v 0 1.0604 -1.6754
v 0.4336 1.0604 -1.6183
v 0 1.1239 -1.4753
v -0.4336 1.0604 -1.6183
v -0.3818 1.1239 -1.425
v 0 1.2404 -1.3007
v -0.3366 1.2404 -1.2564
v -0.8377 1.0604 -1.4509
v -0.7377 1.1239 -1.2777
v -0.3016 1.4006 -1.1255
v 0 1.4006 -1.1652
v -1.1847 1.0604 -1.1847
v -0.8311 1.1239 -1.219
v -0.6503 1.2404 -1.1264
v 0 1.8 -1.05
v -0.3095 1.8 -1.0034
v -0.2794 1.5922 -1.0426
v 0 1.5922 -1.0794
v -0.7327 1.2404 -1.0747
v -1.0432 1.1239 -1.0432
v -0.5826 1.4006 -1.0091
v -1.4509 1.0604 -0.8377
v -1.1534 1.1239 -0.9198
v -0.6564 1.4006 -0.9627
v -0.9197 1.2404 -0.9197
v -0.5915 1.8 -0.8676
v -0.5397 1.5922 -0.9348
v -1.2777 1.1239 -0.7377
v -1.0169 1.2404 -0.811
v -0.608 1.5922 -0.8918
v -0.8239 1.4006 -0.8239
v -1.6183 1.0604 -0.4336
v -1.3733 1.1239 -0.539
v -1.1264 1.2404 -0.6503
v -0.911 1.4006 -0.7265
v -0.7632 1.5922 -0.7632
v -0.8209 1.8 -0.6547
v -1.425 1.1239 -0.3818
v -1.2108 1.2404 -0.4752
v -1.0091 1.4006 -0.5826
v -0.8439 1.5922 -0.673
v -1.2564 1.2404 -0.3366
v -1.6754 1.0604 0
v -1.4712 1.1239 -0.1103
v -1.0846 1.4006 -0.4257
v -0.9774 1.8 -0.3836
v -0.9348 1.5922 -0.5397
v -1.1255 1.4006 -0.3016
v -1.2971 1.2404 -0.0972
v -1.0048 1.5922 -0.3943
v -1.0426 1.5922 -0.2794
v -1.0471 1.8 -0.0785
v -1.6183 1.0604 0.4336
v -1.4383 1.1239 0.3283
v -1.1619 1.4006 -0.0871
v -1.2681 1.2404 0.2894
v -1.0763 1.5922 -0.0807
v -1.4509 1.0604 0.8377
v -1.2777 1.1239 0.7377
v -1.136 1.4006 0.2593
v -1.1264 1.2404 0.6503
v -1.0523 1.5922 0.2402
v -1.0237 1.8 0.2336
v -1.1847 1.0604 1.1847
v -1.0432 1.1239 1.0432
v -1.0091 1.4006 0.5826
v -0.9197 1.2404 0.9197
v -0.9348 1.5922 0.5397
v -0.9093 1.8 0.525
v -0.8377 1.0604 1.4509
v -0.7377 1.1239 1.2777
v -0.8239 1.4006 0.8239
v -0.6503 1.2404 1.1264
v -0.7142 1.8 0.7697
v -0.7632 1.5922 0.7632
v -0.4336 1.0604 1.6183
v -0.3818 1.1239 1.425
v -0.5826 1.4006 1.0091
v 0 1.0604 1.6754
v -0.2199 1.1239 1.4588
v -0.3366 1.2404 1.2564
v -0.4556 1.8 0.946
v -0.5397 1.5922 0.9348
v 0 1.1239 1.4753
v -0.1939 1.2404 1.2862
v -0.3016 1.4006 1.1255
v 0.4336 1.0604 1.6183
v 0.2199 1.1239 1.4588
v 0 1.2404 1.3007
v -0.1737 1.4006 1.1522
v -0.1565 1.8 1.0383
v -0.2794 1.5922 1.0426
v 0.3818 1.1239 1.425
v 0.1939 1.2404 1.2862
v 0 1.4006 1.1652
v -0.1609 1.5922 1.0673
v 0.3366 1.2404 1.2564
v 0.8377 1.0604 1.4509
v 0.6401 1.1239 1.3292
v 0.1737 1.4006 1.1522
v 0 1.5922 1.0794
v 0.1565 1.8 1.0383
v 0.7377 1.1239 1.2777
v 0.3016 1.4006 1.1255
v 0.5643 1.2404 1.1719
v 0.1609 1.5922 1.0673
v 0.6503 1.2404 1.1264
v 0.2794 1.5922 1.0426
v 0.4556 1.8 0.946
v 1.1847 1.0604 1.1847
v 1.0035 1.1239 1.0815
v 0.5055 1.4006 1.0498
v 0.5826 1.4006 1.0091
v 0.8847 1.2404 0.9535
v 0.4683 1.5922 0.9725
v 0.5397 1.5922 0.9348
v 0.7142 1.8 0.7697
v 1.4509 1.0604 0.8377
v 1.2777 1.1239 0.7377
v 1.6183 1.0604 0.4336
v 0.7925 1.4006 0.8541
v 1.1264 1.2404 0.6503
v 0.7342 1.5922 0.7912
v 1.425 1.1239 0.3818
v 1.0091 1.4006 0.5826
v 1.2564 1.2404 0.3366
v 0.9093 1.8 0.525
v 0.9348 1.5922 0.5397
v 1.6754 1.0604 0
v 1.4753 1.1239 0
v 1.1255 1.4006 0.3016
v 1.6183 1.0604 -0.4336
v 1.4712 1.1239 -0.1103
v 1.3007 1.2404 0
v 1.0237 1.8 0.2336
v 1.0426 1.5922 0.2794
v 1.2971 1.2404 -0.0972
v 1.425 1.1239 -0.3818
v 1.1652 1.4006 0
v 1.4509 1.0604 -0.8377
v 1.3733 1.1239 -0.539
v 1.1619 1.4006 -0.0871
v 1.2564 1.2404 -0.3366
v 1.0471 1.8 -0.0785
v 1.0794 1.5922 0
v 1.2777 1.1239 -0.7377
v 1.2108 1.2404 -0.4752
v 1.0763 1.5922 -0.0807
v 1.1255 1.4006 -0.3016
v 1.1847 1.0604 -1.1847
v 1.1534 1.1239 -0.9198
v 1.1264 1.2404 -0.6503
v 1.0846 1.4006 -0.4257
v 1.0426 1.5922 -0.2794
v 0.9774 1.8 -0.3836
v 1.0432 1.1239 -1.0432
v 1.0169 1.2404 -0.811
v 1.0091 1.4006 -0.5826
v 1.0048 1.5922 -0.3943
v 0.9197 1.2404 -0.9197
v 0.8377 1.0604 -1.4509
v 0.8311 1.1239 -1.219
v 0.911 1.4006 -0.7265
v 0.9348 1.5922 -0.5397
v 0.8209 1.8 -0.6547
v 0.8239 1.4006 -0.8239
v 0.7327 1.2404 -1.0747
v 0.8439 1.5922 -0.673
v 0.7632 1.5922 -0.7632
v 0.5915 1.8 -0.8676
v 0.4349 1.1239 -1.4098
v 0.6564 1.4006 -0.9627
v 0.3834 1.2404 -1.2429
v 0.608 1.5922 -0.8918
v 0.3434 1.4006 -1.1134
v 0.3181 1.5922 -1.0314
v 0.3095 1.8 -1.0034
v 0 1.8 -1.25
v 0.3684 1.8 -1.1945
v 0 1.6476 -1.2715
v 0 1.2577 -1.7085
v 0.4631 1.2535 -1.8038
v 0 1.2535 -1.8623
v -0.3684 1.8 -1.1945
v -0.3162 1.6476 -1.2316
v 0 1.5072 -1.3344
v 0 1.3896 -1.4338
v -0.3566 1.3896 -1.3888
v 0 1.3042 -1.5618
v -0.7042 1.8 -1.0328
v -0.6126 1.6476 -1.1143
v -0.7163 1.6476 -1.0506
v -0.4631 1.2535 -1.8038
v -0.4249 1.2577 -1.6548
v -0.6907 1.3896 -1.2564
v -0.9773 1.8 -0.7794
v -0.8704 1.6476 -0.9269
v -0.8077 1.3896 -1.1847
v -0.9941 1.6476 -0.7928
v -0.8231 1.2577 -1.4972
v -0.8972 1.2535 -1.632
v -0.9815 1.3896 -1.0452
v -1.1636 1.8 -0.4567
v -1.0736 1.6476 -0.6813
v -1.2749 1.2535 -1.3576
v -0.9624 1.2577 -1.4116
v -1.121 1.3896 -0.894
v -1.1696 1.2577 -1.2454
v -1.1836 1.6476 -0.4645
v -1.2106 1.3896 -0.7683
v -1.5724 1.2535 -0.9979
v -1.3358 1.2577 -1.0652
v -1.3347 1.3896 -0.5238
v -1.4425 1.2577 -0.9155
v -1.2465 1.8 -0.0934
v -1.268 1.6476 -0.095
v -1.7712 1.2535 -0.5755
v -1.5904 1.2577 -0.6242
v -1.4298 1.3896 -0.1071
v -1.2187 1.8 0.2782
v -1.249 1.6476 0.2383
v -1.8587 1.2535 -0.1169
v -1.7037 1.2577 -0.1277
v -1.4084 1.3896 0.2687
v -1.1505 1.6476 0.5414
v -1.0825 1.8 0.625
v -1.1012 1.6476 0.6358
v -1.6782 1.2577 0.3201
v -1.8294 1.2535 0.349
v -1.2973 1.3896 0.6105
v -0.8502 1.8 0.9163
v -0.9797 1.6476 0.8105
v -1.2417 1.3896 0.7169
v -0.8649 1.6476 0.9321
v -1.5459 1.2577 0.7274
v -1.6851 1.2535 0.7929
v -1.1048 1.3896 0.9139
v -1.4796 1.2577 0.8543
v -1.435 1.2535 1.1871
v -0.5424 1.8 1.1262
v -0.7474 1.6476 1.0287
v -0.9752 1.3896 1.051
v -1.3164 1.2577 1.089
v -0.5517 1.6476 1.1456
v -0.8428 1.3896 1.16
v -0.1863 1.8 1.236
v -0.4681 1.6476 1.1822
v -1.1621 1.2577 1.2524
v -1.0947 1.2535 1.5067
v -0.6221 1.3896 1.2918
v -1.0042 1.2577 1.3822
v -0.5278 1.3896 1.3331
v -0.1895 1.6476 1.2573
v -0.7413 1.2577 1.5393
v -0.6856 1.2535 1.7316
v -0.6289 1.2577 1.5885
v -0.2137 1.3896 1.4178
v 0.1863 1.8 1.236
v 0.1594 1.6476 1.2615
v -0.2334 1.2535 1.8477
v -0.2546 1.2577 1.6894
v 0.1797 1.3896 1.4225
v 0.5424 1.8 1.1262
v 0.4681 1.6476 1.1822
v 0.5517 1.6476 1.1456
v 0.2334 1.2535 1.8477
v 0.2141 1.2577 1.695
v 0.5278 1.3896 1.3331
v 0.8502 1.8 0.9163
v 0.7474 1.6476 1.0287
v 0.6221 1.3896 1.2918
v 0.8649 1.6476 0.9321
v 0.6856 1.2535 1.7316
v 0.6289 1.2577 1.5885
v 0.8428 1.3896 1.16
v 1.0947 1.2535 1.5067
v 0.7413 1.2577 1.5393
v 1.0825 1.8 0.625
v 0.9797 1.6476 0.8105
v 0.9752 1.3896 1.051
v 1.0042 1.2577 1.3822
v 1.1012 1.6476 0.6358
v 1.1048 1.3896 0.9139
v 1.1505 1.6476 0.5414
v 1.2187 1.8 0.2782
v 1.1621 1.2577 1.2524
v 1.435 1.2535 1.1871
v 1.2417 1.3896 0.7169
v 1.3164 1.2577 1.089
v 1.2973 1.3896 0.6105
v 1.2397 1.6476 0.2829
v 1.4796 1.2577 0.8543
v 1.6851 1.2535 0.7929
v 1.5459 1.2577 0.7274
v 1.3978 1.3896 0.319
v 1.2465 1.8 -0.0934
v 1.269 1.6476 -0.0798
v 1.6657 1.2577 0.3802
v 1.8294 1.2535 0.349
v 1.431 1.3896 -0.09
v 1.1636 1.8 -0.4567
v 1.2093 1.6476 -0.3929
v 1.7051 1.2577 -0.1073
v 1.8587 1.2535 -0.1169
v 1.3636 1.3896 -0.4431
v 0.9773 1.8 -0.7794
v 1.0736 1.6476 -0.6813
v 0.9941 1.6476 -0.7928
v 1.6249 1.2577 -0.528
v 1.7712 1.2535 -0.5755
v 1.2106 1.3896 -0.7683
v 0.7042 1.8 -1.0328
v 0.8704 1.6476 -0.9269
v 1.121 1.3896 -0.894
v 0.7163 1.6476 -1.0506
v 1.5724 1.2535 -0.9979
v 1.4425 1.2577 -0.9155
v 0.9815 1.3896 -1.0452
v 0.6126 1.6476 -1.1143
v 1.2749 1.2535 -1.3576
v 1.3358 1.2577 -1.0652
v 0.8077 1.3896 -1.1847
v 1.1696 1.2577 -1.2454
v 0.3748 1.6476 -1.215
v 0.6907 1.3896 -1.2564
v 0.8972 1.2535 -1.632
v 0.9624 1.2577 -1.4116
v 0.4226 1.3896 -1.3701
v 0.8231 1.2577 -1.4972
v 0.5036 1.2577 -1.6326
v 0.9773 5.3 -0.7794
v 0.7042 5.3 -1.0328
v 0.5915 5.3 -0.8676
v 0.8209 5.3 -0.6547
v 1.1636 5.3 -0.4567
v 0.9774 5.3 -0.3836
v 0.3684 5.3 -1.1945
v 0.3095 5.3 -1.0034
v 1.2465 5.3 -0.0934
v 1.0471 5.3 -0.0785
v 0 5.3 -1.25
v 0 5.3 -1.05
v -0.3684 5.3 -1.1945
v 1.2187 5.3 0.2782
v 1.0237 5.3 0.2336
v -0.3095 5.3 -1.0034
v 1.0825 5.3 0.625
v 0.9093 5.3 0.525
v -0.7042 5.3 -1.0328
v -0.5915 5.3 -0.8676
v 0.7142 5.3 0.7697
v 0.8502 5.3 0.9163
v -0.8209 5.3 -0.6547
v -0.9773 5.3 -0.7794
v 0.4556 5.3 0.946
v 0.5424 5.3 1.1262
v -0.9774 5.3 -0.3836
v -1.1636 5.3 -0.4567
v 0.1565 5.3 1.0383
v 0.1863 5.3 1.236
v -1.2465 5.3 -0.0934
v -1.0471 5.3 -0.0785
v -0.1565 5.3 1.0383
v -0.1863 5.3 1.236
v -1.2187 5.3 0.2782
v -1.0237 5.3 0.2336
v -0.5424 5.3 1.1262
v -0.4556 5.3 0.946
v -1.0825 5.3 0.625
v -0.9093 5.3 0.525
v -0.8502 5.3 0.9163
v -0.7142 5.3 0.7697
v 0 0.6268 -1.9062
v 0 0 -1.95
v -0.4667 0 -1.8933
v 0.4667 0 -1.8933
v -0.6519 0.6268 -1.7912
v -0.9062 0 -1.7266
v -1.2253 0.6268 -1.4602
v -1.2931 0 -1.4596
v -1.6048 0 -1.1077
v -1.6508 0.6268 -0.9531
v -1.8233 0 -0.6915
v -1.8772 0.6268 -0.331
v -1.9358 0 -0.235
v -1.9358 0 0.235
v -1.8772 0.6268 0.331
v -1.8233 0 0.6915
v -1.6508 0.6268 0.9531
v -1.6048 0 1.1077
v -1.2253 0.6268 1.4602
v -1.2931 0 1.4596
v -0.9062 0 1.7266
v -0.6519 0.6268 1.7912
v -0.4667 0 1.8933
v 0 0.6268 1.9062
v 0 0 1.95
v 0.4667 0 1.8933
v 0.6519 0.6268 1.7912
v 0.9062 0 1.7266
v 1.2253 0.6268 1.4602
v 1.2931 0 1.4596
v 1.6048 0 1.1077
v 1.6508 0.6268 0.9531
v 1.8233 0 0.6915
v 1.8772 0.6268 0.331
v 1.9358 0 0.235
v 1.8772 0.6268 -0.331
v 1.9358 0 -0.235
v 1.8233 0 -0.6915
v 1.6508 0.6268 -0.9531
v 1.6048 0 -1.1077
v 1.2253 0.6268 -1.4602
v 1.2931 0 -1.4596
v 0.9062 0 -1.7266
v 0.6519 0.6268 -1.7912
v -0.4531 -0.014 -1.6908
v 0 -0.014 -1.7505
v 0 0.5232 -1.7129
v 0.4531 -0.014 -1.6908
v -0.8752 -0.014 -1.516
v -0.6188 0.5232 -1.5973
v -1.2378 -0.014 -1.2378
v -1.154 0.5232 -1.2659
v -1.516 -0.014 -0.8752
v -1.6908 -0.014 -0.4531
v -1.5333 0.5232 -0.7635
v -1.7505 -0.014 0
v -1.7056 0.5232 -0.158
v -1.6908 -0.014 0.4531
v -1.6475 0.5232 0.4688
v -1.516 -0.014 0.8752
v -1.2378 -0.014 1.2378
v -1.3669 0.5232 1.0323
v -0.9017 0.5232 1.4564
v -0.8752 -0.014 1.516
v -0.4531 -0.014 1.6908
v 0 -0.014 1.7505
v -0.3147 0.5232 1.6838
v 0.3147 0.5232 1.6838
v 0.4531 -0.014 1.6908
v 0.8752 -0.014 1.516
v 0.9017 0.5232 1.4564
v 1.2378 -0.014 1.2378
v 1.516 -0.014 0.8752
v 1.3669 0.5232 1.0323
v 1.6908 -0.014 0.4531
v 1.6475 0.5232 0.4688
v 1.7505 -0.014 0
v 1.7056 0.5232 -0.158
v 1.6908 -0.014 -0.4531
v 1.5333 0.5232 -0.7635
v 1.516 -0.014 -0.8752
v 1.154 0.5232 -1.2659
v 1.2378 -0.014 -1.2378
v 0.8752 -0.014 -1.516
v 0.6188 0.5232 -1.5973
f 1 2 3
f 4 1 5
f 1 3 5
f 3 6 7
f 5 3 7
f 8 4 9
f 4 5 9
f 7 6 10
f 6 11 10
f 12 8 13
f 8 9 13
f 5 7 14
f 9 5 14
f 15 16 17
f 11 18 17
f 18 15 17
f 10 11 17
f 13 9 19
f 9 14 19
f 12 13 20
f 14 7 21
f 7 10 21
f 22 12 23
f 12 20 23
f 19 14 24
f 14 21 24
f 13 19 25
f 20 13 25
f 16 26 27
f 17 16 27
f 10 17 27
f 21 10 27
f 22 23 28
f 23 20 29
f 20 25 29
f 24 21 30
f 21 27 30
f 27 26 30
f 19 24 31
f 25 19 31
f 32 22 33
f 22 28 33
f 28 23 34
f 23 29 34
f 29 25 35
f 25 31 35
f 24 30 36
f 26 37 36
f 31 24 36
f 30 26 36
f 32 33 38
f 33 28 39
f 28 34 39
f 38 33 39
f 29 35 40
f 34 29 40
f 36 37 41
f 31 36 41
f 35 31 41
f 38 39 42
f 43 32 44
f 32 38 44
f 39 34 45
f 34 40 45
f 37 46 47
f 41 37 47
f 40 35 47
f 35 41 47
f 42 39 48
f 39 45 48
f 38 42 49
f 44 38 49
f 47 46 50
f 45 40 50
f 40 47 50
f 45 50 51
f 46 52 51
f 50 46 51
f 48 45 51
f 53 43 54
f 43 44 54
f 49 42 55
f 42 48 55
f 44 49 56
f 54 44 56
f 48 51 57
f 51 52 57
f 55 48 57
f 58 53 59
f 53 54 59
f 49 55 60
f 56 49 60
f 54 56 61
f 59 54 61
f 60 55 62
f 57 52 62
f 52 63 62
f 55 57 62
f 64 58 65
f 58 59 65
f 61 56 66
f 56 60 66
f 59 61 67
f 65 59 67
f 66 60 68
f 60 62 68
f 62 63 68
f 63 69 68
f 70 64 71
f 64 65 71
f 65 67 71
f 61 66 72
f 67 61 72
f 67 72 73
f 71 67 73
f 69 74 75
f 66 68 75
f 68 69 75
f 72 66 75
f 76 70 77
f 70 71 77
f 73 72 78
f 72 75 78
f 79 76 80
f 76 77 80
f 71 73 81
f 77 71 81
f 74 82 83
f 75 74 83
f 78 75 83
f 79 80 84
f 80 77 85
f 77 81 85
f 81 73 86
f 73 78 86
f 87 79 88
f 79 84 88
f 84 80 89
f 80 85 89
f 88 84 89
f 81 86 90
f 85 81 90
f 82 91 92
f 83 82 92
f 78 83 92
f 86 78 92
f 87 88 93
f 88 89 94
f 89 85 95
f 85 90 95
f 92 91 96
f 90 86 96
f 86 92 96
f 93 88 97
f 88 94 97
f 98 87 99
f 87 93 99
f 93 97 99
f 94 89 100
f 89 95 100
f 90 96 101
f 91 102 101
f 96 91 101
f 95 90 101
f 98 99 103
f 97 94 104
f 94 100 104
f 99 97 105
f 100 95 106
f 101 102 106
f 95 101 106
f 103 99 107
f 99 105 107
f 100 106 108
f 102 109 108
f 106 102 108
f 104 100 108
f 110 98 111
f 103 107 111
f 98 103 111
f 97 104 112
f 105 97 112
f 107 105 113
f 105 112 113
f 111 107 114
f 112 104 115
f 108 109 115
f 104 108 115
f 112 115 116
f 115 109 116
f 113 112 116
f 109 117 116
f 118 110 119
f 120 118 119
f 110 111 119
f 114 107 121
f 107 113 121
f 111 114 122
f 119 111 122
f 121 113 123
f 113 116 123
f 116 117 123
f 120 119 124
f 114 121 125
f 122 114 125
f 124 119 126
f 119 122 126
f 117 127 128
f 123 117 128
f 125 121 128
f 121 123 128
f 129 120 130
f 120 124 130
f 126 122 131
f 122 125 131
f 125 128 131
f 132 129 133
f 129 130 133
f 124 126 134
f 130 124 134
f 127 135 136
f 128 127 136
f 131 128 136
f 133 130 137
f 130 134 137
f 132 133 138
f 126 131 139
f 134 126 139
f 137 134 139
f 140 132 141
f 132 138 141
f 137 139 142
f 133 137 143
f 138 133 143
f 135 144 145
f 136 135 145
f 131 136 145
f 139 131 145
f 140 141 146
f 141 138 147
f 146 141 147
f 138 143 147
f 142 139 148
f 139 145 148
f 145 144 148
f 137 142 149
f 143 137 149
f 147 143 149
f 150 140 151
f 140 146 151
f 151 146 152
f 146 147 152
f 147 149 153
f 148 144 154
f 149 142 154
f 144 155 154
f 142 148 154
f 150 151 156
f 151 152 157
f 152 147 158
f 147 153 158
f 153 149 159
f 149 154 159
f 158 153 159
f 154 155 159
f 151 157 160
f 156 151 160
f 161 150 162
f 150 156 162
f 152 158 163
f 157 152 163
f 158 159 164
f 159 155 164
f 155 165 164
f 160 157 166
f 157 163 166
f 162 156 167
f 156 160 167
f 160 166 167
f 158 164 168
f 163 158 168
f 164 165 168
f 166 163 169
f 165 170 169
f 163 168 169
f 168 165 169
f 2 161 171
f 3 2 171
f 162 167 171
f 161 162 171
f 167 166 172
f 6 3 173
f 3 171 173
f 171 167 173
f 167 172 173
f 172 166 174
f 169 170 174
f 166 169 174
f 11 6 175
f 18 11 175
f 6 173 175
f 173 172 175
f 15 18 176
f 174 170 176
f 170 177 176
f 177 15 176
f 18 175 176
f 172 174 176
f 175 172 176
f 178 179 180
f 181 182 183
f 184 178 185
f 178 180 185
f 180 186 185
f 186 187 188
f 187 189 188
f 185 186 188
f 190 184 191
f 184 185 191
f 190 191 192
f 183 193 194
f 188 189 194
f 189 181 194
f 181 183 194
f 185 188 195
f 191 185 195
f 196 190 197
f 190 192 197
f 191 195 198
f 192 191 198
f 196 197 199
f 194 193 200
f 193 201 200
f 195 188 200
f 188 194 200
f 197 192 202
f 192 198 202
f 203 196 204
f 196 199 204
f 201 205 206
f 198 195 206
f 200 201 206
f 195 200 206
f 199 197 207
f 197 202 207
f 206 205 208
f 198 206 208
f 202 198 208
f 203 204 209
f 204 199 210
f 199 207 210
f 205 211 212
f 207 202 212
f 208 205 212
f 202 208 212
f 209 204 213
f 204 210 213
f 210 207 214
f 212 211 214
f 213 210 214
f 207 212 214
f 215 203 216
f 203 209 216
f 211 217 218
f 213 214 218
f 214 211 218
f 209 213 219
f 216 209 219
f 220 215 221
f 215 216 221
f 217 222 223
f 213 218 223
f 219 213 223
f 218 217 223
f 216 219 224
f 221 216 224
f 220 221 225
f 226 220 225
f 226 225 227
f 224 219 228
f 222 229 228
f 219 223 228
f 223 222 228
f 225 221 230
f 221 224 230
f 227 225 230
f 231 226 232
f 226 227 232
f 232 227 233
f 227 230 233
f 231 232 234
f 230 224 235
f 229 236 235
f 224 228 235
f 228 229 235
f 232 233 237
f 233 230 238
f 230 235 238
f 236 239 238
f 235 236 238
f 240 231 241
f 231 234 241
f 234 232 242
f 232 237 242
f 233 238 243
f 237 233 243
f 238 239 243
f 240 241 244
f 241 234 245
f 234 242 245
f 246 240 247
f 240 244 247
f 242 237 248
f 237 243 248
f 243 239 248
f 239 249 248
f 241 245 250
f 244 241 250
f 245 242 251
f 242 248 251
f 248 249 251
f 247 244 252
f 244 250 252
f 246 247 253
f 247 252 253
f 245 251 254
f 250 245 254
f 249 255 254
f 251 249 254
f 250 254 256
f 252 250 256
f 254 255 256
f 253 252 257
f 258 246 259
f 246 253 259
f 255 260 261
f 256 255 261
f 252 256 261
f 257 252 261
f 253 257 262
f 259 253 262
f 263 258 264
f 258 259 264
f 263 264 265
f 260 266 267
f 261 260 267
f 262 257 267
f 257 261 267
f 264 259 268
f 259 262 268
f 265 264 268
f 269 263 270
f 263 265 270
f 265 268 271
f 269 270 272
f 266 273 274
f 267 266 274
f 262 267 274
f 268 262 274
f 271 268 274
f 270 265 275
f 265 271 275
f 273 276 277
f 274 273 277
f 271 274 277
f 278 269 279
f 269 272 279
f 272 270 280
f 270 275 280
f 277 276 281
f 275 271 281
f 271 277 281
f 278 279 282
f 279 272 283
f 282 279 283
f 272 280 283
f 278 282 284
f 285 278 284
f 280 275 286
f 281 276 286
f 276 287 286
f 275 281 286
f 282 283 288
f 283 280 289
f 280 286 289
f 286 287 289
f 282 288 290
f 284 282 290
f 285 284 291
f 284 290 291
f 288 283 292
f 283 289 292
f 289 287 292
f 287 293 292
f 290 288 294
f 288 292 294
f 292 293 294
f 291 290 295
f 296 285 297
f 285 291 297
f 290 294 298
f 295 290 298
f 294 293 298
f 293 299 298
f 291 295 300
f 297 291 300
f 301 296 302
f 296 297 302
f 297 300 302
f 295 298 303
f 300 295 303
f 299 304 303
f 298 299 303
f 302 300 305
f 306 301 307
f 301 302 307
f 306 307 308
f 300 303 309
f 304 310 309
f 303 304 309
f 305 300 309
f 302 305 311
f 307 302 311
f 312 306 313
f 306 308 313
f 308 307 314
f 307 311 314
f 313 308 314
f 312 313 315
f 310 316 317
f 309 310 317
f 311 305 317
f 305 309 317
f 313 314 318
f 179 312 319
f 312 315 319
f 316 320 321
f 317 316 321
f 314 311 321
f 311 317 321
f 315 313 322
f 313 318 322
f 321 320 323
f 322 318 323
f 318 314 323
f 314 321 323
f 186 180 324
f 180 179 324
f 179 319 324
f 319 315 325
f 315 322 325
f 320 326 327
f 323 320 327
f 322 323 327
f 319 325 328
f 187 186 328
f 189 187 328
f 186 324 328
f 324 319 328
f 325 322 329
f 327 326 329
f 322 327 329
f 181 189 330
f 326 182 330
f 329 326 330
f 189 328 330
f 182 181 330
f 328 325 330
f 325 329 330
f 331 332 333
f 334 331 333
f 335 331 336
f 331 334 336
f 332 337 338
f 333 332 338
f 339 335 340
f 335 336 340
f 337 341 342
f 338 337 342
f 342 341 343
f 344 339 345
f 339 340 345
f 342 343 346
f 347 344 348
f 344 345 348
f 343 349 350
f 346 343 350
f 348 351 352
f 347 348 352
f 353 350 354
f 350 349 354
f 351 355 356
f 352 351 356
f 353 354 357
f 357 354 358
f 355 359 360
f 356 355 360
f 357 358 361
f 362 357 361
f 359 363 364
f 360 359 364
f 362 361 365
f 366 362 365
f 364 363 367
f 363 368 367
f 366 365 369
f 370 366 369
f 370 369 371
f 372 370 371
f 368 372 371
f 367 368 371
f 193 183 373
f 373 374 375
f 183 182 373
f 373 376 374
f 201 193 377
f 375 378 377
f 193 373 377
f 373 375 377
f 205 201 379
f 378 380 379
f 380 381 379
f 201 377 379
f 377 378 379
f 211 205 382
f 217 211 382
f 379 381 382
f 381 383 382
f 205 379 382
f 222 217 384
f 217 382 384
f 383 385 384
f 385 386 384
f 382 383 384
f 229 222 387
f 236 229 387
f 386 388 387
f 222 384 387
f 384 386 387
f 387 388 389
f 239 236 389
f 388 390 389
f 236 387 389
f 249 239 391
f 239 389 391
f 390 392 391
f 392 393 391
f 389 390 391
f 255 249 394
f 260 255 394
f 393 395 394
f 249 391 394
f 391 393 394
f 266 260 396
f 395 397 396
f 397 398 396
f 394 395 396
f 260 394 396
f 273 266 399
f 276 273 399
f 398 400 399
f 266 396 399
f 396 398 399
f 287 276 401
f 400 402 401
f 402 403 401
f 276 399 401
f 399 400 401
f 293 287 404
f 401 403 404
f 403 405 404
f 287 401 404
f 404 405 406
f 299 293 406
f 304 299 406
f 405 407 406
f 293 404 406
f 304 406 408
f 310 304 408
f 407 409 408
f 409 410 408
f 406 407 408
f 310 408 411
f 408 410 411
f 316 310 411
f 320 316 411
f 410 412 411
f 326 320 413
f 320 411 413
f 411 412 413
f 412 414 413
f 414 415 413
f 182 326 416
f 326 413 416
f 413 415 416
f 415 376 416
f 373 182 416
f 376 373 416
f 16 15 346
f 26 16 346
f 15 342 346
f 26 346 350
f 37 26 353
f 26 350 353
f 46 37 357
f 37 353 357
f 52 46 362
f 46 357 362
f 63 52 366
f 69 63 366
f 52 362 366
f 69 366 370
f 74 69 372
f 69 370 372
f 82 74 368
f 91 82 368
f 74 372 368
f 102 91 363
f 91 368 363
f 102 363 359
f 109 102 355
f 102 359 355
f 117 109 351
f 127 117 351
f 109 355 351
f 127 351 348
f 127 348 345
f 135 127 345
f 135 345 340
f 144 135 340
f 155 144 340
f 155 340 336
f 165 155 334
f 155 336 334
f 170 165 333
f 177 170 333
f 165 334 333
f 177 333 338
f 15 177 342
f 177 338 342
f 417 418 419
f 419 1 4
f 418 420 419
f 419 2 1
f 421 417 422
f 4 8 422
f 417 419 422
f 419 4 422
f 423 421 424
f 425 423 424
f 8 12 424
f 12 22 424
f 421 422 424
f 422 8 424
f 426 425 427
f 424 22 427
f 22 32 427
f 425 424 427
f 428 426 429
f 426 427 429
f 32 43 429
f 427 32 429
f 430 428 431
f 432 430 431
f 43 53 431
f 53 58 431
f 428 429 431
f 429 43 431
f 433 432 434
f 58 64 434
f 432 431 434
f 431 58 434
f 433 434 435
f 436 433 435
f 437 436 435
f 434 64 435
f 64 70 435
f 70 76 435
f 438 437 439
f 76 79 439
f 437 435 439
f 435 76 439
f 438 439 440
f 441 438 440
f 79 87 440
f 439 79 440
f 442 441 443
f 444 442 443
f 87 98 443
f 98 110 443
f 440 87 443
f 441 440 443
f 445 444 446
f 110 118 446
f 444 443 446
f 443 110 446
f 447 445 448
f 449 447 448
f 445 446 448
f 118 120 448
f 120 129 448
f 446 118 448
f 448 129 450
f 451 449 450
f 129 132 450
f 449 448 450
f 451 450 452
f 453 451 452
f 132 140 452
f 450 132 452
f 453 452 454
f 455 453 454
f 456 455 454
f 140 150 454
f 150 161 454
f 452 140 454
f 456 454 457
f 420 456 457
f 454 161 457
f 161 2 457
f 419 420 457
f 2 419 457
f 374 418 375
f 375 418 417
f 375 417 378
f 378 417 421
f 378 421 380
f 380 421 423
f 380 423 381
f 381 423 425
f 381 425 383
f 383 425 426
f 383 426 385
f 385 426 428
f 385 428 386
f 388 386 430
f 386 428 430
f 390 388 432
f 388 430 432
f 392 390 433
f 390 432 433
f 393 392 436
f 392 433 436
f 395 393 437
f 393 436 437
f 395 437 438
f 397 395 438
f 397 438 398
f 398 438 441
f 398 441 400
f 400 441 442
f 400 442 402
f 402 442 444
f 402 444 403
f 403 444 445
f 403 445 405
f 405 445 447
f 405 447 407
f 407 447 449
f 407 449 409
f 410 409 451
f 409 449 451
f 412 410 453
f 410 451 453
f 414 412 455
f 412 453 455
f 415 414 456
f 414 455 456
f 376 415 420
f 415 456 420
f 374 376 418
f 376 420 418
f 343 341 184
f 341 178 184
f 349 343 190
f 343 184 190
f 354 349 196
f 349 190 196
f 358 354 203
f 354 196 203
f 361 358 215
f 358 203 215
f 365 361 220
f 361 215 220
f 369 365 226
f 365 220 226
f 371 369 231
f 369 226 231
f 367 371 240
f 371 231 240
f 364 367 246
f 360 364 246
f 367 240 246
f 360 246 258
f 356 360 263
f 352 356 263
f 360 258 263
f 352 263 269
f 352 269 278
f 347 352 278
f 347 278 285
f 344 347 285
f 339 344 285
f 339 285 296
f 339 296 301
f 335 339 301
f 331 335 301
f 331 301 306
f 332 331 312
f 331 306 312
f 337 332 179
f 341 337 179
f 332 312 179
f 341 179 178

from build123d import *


with BuildPart() as part:
    # Szkic2 → Obrót-cienka ścianka3 (revolve)
    with BuildSketch(Plane(origin=(0, 0, 0), x_dir=(0, 0, -1), z_dir=(1, 0, 0))):
        with BuildLine():
            Line((1.25, 5.3), (1.25, 1.8))
            ThreePointArc((1.25, 1.8), (1.433795811, 1.38964102), (1.862343608, 1.25354481))
            Line((1.862343608, 1.25354481), (1.95, 0))
            Line((1.95, 0), (1.75048719, -0.013951295))
            Line((1.75048719, -0.013951295), (1.675359173, 1.060429406))
            ThreePointArc((1.675359173, 1.060429406), (1.227295617, 1.315737995), (1.05, 1.8))
            Line((1.05, 1.8), (1.05, 5.3))
            Line((1.05, 5.3), (1.25, 5.3))
        make_face()
    revolve(axis=Axis((0, 0, 0), (0, 1, 0)))


solid = part.part
